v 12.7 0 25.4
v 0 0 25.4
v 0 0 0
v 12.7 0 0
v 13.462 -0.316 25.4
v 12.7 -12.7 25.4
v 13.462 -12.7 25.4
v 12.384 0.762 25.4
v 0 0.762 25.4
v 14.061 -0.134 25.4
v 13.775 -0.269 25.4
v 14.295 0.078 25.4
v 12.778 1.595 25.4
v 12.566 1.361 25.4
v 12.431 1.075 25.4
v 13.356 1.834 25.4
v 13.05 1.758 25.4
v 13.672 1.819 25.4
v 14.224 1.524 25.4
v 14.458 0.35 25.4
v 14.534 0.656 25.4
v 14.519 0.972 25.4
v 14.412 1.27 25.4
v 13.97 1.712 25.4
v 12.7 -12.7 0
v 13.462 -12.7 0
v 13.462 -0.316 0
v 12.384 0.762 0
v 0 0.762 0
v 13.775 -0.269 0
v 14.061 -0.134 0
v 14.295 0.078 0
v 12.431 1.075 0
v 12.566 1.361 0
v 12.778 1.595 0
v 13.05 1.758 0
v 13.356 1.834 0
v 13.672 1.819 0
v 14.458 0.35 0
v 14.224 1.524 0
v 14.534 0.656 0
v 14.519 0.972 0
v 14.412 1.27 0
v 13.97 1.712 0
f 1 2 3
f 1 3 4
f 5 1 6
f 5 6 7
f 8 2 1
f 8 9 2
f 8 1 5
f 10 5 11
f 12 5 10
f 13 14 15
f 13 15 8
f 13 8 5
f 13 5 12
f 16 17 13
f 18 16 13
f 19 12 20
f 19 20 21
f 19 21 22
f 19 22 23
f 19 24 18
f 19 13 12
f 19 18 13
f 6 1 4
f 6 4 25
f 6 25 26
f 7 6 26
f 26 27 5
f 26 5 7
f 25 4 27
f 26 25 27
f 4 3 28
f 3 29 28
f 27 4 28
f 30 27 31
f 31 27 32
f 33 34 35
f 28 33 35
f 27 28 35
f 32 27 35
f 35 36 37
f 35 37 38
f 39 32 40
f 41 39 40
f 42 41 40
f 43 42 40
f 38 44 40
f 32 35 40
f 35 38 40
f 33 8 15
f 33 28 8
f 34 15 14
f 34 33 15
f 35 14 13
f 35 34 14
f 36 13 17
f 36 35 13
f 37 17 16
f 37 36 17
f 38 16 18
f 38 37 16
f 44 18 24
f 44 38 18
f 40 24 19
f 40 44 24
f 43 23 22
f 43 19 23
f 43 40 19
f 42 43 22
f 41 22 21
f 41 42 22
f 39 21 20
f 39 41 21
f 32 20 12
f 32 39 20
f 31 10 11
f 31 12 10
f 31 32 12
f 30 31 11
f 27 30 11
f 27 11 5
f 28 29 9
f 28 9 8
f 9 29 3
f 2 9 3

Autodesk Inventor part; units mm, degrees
ref_plane "YZ Plane" through (0, 0, 0) normal (1, 0, 0) x (0, 1, 0)
ref_plane "XZ Plane" through (0, 0, 0) normal (0, 1, 0) x (-1, 0, 0)
ref_plane "XY Plane" through (0, 0, 0) normal (0, 0, 1) x (1, 0, 0)
sketch "Sketch1" plane through (0, 0, 0) normal (0, 0, 1) x (1, 0, 0)
  line L0 (0, 0) -> (12.7, 0)
  line L1 (12.7, 0) -> (12.7, -12.7)
  line L2 (0, 0.762) -> (12.3844, 0.762)
  line L3 (13.462, -0.3156) -> (13.462, -12.7)
  line L4 (0, 0.762) -> (0, 0)
  line L5 (12.7, -12.7) -> (13.462, -12.7)
  arc A0 (13.462, -0.3156) -> (12.3844, 0.762) centre (13.462, 0.762) ccw
  dimension "d0" = 12.7
  dimension "d1" = 12.7
  dimension "d2" = 0.762
extrude "Extrusion1" add sketch "Sketch1" along normal blind 25.4
properties part number "Hinge_Rear" material "Brass, Soft Yellow"
